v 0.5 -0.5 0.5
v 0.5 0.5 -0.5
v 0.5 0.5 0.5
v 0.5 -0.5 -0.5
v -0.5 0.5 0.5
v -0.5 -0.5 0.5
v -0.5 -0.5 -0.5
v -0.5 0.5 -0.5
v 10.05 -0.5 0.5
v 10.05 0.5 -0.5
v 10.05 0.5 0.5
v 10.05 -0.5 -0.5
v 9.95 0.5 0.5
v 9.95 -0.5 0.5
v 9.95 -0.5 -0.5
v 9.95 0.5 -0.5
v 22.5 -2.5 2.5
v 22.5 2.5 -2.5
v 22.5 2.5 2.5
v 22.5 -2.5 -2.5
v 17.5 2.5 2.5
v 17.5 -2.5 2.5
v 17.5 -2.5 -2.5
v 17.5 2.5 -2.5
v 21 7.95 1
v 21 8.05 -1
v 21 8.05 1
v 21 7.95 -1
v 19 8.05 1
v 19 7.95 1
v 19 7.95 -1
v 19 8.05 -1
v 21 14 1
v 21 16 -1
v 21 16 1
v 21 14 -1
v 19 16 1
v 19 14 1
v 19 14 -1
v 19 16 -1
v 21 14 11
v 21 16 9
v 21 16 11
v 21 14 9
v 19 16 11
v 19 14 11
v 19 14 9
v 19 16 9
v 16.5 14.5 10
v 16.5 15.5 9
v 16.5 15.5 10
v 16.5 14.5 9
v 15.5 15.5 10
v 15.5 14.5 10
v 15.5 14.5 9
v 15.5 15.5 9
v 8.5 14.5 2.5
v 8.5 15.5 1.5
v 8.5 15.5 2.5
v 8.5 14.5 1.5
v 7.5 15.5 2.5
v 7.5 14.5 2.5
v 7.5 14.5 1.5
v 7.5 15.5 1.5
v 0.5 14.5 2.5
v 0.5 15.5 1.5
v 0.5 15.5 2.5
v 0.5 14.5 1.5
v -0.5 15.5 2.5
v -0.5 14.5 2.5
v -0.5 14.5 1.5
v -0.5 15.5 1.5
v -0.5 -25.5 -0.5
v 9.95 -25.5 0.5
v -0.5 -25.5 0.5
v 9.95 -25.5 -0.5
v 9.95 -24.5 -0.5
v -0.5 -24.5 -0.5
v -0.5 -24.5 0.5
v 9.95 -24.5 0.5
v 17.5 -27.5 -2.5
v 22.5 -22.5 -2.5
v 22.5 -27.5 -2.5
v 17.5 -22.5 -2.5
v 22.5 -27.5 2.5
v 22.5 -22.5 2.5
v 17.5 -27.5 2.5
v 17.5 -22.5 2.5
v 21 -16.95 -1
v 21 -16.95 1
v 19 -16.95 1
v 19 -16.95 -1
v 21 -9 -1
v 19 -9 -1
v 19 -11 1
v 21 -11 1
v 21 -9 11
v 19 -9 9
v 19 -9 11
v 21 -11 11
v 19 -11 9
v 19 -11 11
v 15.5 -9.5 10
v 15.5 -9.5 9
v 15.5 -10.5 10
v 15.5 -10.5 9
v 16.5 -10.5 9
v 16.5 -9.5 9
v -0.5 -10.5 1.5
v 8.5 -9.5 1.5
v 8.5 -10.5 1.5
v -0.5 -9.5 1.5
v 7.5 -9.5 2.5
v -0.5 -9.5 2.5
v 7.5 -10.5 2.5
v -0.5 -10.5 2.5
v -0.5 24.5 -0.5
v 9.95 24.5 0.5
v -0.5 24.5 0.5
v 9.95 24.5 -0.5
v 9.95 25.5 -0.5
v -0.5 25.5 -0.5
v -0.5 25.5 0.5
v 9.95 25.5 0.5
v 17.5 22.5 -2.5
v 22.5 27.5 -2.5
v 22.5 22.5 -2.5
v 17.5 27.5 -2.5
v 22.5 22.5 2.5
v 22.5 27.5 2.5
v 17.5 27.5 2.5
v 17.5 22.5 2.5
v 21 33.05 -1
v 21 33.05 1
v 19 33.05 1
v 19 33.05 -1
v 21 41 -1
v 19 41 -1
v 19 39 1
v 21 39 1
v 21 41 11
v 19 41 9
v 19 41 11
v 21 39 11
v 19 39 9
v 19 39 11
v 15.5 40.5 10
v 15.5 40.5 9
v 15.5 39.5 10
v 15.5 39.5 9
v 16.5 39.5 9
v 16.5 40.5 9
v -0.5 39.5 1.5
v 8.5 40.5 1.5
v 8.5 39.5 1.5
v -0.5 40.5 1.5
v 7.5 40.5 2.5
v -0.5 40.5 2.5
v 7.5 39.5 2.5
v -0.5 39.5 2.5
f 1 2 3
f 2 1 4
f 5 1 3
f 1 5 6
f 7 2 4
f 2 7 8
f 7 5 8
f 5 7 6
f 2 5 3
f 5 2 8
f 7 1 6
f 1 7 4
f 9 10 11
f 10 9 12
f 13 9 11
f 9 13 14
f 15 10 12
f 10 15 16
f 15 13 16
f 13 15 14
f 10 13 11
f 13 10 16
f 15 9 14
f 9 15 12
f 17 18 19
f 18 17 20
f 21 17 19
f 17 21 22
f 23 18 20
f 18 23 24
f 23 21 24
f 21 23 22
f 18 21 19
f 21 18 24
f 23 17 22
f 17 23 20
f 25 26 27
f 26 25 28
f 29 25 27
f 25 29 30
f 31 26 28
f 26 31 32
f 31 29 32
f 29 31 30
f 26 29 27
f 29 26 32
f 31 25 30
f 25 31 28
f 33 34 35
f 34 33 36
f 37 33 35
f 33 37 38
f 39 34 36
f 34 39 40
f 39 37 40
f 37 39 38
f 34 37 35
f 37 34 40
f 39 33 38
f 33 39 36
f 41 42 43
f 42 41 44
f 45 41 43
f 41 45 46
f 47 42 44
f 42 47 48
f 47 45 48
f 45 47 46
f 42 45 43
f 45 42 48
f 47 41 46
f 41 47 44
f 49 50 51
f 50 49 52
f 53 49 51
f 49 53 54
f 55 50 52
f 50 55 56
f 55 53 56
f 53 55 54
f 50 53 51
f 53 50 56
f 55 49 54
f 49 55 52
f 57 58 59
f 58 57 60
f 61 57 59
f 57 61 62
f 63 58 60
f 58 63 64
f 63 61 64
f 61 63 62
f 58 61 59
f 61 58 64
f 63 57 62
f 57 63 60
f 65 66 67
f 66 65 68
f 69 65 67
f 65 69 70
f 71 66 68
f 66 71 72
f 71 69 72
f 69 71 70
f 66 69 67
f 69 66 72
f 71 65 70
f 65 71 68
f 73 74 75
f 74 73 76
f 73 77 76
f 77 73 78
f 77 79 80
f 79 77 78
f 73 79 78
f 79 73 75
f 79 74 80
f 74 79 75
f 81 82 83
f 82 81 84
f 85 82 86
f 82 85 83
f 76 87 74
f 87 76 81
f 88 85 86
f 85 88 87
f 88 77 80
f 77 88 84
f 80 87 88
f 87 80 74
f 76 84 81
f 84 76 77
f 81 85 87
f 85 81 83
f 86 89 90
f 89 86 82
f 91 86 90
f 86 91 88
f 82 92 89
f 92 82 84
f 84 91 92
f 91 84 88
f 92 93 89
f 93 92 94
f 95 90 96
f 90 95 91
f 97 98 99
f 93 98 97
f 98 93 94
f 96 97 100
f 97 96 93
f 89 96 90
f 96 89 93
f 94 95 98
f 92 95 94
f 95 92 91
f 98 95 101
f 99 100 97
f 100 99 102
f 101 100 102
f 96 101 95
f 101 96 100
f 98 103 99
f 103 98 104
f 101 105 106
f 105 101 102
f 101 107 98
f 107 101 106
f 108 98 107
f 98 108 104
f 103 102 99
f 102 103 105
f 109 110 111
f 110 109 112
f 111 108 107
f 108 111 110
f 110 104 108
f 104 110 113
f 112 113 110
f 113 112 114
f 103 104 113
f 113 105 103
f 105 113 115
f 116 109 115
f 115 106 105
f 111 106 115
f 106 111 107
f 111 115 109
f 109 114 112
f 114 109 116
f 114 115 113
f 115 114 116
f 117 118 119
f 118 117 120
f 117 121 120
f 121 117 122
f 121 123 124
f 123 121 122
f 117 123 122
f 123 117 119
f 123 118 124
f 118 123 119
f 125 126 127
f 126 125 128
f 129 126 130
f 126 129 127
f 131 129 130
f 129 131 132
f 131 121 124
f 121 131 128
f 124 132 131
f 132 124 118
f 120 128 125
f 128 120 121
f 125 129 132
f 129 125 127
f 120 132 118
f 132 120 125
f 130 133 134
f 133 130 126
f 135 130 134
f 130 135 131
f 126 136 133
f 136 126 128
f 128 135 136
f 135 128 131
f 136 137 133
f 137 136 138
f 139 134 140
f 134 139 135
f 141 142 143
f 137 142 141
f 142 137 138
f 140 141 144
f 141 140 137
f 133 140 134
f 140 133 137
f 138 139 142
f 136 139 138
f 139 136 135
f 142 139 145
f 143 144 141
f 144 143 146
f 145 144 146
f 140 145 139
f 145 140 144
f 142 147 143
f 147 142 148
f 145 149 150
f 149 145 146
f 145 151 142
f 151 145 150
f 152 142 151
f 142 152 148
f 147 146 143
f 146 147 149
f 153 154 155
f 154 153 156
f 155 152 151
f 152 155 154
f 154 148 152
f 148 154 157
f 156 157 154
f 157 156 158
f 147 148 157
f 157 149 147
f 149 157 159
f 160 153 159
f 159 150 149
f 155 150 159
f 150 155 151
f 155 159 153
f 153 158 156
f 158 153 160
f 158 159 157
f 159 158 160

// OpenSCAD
/*--------------------------------------------------------------------------------------
/ General purpose multi-segment channel module: polychannel.
/
/ Given a list of sizes and positions, a series of connected channels is constructed
/ using the hull() operation to connect sequential pairs of cubes with specified
/ size and position as given in the sizes and positions list.
/
/ Rev. 1, 9/28/22, by G. Nordin
--------------------------------------------------------------------------------------*/

module shape3D(size, position, center=true) {
    translate(position) cube(size, center=center);
}

// These functions are helper functions to create a vector of absolute positions from
// a vector of relative positions.
// See https://forum.openscad.org/Calculating-Summarize-Arrays-generate-Array-td29132.html
// for the original code, which cummulatively summed scalars.
function partial_sum(v, n, r = 0) = n <= 0 
        ? r + v[0] 
        : partial_sum(v, n - 1, r + v[n]); 
function partial_sum_vectors(v, n, r = [0,0,0]) = partial_sum(v, n, r); 

// Tests for partial_sum and partial_sum_vectors
dim = [10, 8, 2, 25, 5]; 
n = len(dim); 
x_pos = [for(i = [0:n-1]) partial_sum(dim, i)]; 
echo(x_pos); // ECHO: [10, 18, 20, 45, 50] 
echo("");
dim2 = [[10, 1], [8, 1], [2, 1], [25, 1], [5, 2]]; 
n2 = len(dim2); 
x_pos2 = [for(i = [0:n2-1]) partial_sum_vectors(dim2, i)]; 
echo(x_pos2); // ECHO: [[10, 1], [18, 2], [20, 3], [45, 4], [50, 6]]
echo("");
x_pos3 = [for(i = [0:n2-1]) partial_sum(dim2, i, [0,0,0])]; 
echo(x_pos3); // ECHO: [[10, 1], [18, 2], [20, 3], [45, 4], [50, 6]]
echo("");

module polychannel_absolute_positions(sizes, positions, clr="lightblue", center=true, show_only_shapes=false) {
    if (show_only_shapes) {
        for (i = [0:len(sizes)-1]) {
            color(clr) shape3D(sizes[i], positions[i]);
        }
    } else {
        for (i = [1:len(sizes)-1]) {
            color(clr) hull() {
                shape3D(sizes[i-1], positions[i-1]);
                shape3D(sizes[i], positions[i]);
            };
        };
    }
}

module polychannel(sizes, positions, relative_positions=false, clr="lightblue", center=true, show_only_shapes=false) {
    assert(len(sizes) == len(positions), "polychannel: sizes and positions arrays must have the same length");
    if (relative_positions) {
        absolute_positions = [for(i = [0:len(sizes)-1]) partial_sum_vectors(positions, i)];
        polychannel_absolute_positions(sizes, absolute_positions, clr=clr, center=center, show_only_shapes=show_only_shapes);
    } else {
        polychannel_absolute_positions(sizes, positions, clr=clr, center=center, show_only_shapes=show_only_shapes);
    }
}


// Example usage - see polychannel_result.png for output

size1 = [1, 1, 1];

sizes = [
    size1,
    [0.1, 1, 1],
    5 * size1,
    [2, 0.1, 2],
    2 * size1,
    2 * size1,
    size1,
    size1,
    size1
];
positions = [
    [0, 0, 0],
    [10, 0, 0],
    [20, 0, 0],
    [20, 8, 0],
    [20, 15, 0],
    [20, 15, 10],
    [16, 15, 9.5],
    [8, 15, 2],
    [0, 15, 2]
];
relative_positions = [
    [0, 0, 0],  // All subsequent positions are relative to this position
    [10, 0, 0],
    [10, 0, 0],
    [0, 8, 0],
    [0, 7, 0],
    [0, 0, 10],
    [-4, 0, -0.5],
    [-8, 0, -7.5],
    [-8, 0, 0]
];

polychannel(sizes, positions, clr="red", show_only_shapes=true);

translate([0, -25, 0]) polychannel(sizes, positions, clr="Salmon");

translate([0, 25, 0]) polychannel(sizes, relative_positions, relative_positions=true);
